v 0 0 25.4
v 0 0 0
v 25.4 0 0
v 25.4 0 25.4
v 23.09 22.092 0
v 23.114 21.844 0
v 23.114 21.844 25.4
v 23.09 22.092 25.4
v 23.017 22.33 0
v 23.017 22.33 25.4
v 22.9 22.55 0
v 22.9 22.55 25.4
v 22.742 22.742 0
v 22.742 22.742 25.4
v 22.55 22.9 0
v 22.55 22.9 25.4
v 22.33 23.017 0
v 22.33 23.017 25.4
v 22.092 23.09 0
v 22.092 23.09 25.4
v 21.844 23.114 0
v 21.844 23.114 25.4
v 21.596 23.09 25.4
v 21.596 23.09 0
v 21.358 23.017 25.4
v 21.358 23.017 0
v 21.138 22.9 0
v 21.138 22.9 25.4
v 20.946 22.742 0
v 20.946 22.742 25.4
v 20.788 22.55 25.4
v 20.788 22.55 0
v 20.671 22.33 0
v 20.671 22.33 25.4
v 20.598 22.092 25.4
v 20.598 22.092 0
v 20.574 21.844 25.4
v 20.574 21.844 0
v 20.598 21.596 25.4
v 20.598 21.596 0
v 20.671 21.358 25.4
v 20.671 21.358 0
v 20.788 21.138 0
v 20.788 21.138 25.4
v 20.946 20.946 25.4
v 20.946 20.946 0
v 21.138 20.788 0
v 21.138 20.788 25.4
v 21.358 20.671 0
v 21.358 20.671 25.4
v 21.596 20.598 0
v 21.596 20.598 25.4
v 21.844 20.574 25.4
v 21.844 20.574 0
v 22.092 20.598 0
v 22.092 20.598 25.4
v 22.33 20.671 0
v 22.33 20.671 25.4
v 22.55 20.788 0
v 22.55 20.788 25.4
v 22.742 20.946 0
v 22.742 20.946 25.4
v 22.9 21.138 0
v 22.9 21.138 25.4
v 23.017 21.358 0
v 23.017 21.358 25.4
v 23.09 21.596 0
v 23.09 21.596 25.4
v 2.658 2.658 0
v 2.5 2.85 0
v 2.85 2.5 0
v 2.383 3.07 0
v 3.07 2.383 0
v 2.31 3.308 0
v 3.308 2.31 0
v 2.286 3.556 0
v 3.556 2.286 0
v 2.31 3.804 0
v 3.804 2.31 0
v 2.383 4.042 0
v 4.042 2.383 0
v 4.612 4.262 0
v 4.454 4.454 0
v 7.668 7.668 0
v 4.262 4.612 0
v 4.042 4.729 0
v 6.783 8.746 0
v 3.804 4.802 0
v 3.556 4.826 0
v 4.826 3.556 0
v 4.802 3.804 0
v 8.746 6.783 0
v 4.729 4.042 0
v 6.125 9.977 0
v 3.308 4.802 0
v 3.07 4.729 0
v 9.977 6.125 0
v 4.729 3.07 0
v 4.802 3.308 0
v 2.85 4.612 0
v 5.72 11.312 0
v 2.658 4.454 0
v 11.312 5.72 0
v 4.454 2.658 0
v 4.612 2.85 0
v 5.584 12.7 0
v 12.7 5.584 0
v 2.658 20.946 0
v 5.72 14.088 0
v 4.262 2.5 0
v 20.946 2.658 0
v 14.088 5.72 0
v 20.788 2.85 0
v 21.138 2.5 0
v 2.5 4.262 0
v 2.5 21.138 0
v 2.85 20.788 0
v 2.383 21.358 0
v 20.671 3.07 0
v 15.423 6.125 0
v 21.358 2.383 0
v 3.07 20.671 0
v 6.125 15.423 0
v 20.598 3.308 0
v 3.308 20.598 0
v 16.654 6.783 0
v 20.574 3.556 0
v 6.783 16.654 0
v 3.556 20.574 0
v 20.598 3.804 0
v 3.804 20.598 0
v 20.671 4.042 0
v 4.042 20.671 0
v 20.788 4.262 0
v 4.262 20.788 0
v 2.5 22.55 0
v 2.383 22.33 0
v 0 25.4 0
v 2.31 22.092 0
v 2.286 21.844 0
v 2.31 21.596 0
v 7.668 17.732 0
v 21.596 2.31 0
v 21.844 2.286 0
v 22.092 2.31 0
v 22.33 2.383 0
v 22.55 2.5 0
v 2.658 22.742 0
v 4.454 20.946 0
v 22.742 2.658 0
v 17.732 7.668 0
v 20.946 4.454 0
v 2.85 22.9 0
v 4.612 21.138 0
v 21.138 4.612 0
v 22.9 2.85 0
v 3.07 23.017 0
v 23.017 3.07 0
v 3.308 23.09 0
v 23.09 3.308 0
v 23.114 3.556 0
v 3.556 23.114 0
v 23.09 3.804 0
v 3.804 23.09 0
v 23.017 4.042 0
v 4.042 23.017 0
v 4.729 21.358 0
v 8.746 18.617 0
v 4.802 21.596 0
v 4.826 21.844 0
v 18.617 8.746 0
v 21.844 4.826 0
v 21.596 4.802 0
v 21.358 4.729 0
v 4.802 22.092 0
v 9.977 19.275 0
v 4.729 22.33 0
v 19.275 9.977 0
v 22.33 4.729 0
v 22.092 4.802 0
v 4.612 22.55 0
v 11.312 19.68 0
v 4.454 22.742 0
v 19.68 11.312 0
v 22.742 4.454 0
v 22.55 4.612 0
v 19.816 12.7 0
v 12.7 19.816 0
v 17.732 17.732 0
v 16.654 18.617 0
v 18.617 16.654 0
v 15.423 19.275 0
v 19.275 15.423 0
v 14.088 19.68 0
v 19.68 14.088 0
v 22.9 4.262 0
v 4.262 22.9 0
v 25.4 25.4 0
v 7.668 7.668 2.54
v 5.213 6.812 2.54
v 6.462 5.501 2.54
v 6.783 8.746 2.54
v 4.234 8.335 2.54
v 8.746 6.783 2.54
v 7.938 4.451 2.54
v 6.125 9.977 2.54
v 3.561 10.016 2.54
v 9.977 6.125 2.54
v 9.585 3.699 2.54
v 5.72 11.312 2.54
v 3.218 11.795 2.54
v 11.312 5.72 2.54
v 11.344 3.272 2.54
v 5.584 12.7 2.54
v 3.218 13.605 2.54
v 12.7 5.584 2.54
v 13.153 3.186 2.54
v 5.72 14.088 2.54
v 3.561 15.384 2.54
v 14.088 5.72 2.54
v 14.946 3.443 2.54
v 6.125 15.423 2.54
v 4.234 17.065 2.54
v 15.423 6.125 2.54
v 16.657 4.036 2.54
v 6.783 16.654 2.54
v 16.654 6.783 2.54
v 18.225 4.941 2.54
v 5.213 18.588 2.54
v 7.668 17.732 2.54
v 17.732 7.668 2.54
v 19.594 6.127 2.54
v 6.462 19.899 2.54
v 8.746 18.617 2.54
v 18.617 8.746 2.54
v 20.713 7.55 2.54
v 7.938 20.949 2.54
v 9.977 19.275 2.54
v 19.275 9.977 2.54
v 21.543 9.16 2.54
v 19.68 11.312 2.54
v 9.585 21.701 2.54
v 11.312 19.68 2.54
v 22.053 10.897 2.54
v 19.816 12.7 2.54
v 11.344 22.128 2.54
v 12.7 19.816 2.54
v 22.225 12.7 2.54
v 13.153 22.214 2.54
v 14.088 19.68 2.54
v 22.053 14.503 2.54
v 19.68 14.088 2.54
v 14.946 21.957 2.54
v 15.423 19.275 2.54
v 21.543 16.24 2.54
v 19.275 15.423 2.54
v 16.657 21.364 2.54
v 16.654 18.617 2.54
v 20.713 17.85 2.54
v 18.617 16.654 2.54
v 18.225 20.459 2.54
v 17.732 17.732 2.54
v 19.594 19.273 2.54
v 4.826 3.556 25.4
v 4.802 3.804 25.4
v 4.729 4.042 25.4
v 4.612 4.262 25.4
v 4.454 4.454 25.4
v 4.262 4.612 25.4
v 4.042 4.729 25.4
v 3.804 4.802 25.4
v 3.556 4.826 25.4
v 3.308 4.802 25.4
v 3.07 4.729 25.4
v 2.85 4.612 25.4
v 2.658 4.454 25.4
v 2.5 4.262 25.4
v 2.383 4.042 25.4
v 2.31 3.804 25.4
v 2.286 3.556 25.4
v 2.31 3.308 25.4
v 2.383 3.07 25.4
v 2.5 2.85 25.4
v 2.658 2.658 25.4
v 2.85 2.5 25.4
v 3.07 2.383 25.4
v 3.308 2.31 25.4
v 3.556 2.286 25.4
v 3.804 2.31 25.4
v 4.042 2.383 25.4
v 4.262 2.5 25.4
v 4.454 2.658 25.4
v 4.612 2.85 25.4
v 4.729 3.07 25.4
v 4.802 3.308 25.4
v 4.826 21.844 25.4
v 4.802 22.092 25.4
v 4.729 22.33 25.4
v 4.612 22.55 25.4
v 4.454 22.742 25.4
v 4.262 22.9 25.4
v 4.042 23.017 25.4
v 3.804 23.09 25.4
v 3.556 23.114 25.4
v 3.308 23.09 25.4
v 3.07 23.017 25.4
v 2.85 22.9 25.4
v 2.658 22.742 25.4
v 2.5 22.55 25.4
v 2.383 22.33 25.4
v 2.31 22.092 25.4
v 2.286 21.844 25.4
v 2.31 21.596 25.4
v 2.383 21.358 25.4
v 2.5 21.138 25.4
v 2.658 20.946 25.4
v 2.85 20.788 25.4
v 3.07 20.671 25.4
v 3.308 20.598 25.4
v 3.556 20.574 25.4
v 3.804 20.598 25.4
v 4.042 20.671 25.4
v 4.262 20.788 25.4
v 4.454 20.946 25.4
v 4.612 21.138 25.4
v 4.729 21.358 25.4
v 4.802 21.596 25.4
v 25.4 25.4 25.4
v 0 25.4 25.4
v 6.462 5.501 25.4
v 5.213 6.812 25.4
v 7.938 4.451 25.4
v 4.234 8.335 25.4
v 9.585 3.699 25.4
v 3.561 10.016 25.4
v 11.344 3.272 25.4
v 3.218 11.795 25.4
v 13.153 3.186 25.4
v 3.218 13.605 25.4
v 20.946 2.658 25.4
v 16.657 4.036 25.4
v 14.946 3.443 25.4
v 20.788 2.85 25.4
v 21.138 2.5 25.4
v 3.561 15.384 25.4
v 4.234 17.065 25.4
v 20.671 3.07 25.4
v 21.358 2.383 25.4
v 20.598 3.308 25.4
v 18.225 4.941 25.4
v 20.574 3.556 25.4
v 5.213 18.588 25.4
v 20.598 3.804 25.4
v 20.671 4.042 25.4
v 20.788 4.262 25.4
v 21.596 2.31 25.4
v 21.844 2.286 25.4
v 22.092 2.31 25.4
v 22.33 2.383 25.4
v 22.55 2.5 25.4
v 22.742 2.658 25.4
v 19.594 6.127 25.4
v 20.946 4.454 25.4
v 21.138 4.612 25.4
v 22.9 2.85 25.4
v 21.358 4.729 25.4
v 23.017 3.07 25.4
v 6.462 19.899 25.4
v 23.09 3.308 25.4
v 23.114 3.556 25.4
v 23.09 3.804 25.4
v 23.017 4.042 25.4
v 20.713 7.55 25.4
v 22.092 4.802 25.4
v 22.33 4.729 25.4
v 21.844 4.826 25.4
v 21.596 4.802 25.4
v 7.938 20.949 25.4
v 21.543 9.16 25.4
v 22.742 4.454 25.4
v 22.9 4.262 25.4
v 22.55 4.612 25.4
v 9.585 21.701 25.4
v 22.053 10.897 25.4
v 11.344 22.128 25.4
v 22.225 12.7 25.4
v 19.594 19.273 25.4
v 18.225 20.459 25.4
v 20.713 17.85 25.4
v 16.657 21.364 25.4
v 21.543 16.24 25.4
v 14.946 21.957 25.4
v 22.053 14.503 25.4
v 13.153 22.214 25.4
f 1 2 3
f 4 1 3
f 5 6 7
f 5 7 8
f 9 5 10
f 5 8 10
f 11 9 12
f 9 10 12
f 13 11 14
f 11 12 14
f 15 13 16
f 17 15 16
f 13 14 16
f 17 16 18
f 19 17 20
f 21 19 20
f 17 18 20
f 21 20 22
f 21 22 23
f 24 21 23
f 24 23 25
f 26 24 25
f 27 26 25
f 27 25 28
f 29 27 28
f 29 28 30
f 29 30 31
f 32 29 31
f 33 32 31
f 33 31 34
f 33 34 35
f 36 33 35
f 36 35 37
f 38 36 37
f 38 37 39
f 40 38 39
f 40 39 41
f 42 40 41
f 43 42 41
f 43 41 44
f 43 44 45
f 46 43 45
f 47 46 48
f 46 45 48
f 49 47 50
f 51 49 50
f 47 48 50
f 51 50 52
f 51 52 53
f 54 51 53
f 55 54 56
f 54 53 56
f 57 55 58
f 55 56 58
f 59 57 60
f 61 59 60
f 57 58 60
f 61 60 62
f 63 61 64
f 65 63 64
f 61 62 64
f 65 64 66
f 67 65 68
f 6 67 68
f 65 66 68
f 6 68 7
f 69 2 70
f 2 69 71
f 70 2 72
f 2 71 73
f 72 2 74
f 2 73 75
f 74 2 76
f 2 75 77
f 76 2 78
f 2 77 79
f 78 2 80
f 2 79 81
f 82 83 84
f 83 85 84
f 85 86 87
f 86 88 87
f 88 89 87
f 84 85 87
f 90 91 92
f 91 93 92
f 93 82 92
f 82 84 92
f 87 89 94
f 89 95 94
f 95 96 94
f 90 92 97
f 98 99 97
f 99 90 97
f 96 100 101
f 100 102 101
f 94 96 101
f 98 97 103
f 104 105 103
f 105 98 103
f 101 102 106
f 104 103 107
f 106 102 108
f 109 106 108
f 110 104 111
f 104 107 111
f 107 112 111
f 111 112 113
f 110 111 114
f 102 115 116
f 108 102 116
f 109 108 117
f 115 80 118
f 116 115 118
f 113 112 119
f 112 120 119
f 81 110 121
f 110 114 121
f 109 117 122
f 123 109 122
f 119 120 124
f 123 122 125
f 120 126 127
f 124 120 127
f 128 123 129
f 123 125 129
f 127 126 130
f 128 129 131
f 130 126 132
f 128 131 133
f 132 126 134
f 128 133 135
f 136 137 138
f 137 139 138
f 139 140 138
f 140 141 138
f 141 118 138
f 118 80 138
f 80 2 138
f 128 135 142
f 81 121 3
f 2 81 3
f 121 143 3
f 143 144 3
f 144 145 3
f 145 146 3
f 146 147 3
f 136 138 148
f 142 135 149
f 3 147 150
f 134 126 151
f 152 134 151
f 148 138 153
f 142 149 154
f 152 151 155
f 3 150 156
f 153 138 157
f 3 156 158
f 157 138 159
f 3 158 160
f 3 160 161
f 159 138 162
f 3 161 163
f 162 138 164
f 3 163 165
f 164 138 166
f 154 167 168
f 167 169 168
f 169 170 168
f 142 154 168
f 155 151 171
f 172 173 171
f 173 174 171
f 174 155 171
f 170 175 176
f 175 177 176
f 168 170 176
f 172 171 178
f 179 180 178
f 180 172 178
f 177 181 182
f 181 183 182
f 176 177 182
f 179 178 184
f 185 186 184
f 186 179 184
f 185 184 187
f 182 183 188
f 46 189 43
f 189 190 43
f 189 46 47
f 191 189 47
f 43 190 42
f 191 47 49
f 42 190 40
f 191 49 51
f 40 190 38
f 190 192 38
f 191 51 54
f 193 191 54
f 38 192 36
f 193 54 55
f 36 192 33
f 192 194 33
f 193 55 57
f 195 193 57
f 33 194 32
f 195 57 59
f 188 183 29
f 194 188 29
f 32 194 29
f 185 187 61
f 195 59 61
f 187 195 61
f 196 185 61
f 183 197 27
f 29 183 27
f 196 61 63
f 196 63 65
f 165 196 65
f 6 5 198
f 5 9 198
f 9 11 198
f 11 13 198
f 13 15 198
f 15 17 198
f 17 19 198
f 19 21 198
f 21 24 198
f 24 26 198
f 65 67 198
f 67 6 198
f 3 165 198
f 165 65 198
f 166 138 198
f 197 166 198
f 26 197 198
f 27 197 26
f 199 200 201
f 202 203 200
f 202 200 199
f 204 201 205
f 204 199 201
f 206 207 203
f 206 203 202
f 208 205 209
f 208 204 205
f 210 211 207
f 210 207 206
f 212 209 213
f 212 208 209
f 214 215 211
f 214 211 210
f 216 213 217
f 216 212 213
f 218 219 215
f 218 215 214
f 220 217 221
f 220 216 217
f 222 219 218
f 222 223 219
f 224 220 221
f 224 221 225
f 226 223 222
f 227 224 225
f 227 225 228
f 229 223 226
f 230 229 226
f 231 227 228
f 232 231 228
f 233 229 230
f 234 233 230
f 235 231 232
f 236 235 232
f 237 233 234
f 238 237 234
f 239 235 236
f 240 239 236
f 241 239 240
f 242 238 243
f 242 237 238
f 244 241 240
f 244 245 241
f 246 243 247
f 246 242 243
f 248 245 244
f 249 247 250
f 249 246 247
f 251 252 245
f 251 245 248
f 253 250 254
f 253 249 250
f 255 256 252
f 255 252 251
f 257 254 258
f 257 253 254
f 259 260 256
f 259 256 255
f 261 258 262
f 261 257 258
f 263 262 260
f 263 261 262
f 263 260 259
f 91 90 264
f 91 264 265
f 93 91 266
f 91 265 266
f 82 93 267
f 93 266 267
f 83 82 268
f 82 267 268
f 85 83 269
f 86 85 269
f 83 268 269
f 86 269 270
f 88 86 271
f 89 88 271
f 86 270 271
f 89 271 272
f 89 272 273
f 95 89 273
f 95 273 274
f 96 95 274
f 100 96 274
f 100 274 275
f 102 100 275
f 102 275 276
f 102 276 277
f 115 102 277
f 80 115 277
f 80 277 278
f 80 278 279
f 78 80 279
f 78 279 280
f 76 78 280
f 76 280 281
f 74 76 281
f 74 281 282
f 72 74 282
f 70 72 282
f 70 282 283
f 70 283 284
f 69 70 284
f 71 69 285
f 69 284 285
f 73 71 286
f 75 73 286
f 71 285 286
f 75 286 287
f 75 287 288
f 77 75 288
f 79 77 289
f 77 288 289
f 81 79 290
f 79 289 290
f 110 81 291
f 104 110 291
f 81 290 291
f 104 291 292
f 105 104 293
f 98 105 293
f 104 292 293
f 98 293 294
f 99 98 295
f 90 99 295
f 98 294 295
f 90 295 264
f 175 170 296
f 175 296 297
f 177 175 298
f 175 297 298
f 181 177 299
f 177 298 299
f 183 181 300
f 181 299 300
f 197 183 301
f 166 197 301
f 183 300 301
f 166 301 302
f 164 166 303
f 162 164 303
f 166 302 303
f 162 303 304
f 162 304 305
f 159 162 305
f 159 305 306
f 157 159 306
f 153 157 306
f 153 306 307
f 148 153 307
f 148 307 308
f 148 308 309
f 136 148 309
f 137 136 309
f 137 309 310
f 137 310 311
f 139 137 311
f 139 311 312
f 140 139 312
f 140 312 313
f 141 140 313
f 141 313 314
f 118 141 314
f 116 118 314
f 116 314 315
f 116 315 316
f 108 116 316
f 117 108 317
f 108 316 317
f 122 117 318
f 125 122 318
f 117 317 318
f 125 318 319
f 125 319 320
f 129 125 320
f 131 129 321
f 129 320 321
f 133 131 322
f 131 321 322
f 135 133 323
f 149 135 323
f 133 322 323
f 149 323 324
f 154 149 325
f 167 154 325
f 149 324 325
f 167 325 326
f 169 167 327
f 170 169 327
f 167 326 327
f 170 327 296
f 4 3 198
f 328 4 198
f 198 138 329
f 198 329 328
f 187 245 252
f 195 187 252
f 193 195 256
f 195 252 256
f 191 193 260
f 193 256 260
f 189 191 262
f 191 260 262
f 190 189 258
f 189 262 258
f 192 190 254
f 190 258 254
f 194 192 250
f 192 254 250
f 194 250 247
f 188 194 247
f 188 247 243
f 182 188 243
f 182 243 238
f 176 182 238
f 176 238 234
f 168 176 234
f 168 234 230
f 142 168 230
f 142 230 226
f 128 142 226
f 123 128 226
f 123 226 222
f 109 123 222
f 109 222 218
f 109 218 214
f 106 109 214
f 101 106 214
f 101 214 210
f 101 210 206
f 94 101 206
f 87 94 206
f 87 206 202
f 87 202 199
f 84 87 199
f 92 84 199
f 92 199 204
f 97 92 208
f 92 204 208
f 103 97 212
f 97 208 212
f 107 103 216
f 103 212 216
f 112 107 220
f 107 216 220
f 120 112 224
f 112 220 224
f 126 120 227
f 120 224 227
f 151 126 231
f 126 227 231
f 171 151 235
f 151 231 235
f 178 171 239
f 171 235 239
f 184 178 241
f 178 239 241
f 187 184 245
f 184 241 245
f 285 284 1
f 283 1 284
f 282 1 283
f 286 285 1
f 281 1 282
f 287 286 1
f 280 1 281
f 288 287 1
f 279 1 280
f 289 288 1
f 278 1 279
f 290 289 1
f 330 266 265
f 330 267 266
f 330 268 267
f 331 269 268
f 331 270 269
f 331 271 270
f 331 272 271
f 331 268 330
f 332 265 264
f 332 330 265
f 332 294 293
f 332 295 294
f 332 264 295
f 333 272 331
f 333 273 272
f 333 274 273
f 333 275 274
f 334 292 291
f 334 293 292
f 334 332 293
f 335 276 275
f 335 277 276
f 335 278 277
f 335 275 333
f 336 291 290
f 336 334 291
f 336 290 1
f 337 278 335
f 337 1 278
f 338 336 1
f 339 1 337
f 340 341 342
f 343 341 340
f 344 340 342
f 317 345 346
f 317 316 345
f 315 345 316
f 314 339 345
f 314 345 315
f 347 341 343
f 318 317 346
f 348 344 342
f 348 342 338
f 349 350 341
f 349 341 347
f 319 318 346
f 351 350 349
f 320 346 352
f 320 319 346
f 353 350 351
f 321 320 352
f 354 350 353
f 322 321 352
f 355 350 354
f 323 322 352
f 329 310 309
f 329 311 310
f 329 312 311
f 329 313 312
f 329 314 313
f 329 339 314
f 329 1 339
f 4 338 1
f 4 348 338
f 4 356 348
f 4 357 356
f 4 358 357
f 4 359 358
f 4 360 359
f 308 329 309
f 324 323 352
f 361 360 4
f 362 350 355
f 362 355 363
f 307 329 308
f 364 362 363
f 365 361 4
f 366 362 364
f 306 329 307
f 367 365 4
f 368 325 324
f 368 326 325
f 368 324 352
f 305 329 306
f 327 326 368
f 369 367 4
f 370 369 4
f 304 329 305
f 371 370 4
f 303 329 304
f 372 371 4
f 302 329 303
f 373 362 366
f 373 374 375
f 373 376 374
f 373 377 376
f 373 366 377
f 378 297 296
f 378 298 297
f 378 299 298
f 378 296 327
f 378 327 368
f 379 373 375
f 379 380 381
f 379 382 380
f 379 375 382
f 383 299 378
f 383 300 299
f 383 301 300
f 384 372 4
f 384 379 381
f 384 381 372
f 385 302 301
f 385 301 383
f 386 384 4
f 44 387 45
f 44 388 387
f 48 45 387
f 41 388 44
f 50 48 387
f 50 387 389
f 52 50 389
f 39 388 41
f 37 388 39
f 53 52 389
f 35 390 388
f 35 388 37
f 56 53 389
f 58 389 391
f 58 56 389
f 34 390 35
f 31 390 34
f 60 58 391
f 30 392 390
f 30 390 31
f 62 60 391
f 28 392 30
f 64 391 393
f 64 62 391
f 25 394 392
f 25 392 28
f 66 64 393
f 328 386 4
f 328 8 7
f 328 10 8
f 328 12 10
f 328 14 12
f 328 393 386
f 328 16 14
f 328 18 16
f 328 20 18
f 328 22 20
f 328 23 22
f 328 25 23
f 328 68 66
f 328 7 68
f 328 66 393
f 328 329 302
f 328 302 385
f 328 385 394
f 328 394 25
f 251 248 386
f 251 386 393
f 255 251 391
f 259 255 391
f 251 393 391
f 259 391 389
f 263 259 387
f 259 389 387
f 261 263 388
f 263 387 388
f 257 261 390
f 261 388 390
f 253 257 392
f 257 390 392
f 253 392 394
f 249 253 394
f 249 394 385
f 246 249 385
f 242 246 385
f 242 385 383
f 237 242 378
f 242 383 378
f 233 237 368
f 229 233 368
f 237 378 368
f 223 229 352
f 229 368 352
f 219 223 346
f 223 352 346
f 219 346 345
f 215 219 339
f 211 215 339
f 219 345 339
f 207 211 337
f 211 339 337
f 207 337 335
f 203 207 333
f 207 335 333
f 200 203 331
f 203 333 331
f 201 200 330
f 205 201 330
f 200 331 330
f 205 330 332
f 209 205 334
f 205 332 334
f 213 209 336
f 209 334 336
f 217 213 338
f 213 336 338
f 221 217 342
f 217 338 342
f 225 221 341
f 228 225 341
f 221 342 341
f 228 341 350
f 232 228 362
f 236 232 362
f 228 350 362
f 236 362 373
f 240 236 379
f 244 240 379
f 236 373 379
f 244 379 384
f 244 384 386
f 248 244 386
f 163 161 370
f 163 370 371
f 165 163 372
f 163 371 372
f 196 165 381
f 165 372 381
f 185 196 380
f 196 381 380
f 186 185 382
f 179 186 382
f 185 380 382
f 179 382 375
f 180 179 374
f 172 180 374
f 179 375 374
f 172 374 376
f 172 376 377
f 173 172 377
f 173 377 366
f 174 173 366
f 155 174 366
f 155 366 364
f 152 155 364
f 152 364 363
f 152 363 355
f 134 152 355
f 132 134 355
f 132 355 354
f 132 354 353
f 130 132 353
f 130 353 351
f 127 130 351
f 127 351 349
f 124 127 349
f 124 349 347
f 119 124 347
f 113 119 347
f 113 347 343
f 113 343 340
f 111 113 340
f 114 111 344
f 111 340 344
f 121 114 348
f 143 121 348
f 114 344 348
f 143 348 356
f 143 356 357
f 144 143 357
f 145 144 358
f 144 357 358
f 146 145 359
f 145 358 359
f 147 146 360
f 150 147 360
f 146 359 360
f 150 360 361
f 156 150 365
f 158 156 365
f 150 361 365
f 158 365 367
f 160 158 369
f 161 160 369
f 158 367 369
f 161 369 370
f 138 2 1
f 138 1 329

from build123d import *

# Parameters (mm, degrees)
F0_W     = 25.4
F0_H     = 25.4
F1_DEPTH = 25.4
F2_R     = 9.525
F3_DEPTH = 22.86
F4_R     = 7.116494
F5_DEPTH = 2.541
F6_R     = 1.27
F7_DEPTH = 25.401


with BuildPart() as f1:
    # F0 (on Top) → F1 (new body)
    with BuildSketch(Plane.XY):
        with Locations((12.7, 12.7)):
            Rectangle(F0_W, F0_H)
    extrude(amount=F1_DEPTH)

    # F2 (on face) → F3 (cut)
    with BuildSketch(Plane.XY.offset(25.4)):
        with Locations((12.7, 12.7)):
            Circle(F2_R)
    extrude(amount=-F3_DEPTH, mode=Mode.SUBTRACT)

    # F4 (on face) → F5 (cut, through all)
    with BuildSketch(Plane.XY.offset(2.54)):
        with Locations((12.7, 12.7)):
            Circle(F4_R)
    extrude(amount=-F5_DEPTH, mode=Mode.SUBTRACT)

    # F6 (on face) → F7 (cut, through all)
    with BuildSketch(Plane.XY.offset(25.4)):
        with Locations((21.844, 3.556)):
            Circle(F6_R)
        with Locations((21.844, 21.844)):
            Circle(F6_R)
        with Locations((3.556, 21.844)):
            Circle(F6_R)
        with Locations((3.556, 3.556)):
            Circle(F6_R)
    extrude(amount=-F7_DEPTH, mode=Mode.SUBTRACT)


solid = f1.part
